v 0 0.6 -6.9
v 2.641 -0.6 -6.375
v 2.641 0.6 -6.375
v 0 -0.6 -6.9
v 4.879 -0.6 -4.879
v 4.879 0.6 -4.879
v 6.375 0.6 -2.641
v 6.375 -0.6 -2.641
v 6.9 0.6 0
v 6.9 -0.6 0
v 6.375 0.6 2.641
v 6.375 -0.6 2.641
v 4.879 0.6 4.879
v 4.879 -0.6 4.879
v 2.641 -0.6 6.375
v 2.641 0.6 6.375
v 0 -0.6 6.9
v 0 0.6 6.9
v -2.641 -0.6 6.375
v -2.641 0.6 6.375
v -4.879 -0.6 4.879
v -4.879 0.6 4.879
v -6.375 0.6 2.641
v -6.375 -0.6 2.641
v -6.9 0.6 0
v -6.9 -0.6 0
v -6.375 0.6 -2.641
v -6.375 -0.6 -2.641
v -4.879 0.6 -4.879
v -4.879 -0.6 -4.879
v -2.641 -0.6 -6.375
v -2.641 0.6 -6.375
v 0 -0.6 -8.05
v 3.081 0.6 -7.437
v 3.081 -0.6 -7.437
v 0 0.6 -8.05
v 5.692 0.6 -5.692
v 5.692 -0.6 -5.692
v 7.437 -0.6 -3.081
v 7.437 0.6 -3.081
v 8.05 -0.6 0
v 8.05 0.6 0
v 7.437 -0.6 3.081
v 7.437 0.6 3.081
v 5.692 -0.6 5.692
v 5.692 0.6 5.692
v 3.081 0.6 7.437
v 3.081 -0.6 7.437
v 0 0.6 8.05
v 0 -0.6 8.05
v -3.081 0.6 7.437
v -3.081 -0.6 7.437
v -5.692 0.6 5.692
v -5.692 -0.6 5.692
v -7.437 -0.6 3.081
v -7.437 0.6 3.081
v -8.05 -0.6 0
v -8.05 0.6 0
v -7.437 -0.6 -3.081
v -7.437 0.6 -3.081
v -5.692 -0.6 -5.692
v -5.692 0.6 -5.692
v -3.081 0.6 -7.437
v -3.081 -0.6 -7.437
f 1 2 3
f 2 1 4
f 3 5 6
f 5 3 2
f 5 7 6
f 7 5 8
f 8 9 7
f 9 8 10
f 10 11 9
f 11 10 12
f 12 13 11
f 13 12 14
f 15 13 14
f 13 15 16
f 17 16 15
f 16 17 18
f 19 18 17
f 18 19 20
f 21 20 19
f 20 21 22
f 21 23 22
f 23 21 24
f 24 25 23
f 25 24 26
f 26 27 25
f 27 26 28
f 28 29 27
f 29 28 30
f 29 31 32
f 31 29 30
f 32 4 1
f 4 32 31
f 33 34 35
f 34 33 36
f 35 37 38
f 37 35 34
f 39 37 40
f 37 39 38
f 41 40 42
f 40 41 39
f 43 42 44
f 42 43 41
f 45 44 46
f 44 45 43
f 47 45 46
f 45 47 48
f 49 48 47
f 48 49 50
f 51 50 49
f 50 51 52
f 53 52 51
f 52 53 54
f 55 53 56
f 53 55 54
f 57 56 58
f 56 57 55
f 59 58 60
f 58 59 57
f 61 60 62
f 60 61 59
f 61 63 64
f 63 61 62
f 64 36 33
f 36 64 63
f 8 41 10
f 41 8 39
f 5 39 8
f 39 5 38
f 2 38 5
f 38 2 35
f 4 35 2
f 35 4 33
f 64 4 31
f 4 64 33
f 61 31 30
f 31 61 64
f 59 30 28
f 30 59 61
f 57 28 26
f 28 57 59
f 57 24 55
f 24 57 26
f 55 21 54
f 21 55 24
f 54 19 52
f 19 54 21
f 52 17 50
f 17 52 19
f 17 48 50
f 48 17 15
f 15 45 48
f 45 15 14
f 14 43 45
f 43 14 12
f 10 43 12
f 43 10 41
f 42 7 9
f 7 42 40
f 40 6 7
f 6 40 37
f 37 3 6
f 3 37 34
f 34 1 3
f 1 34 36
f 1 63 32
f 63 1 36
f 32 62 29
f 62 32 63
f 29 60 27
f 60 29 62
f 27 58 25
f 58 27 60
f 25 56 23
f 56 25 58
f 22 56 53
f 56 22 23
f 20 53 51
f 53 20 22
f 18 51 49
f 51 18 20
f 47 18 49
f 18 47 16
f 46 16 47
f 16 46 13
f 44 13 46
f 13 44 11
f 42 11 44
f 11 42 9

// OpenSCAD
// file: ../p/4-4edge.scad
use <../lib.scad>
function ldraw_lib__4_4edge() = [
// 0 Circle 1.0
// 0 Name: 4-4edge.dat
// 0 Author: James Jessiman
// 0 !LDRAW_ORG Primitive UPDATE 2017-01
// 0 !LICENSE Licensed under CC BY 2.0 and CC BY 4.0 : see CAreadme.txt
// 
// 0 BFC CERTIFY CCW
  [0,"BFC","CERTIFY"],
  [0,"BFC","CCW"],
// 
// 0 !HISTORY 1998-12-15 [PTadmin] Official Update 1998-10
// 0 !HISTORY 2005-12-28 [PTadmin] Official Update 2005-01
// 0 !HISTORY 2007-06-24 [PTadmin] Header formatted for Contributor Agreement
// 0 !HISTORY 2008-07-01 [PTadmin] Official Update 2008-01
// 0 !HISTORY 2017-01-15 [Steffen] BFCed
// 0 !HISTORY 2017-12-30 [PTadmin] Official Update 2017-01
// 
// 
// 2 24 1 0 0 0.9239 0 0.3827
  [2,24,1,0,0,0.9239,0,0.3827],
// 2 24 0.9239 0 0.3827 0.7071 0 0.7071
  [2,24,0.9239,0,0.3827,0.7071,0,0.7071],
// 2 24 0.7071 0 0.7071 0.3827 0 0.9239
  [2,24,0.7071,0,0.7071,0.3827,0,0.9239],
// 2 24 0.3827 0 0.9239 0 0 1
  [2,24,0.3827,0,0.9239,0,0,1],
// 2 24 0 0 1 -0.3827 0 0.9239
  [2,24,0,0,1,-0.3827,0,0.9239],
// 2 24 -0.3827 0 0.9239 -0.7071 0 0.7071
  [2,24,-0.3827,0,0.9239,-0.7071,0,0.7071],
// 2 24 -0.7071 0 0.7071 -0.9239 0 0.3827
  [2,24,-0.7071,0,0.7071,-0.9239,0,0.3827],
// 2 24 -0.9239 0 0.3827 -1 0 -0
  [2,24,-0.9239,0,0.3827,-1,0,-0],
// 2 24 -1 0 -0 -0.9239 0 -0.3827
  [2,24,-1,0,-0,-0.9239,0,-0.3827],
// 2 24 -0.9239 0 -0.3827 -0.7071 0 -0.7071
  [2,24,-0.9239,0,-0.3827,-0.7071,0,-0.7071],
// 2 24 -0.7071 0 -0.7071 -0.3827 0 -0.9239
  [2,24,-0.7071,0,-0.7071,-0.3827,0,-0.9239],
// 2 24 -0.3827 0 -0.9239 0 0 -1
  [2,24,-0.3827,0,-0.9239,0,0,-1],
// 2 24 0 0 -1 0.3827 0 -0.9239
  [2,24,0,0,-1,0.3827,0,-0.9239],
// 2 24 0.3827 0 -0.9239 0.7071 0 -0.7071
  [2,24,0.3827,0,-0.9239,0.7071,0,-0.7071],
// 2 24 0.7071 0 -0.7071 0.9239 0 -0.3827
  [2,24,0.7071,0,-0.7071,0.9239,0,-0.3827],
// 2 24 0.9239 0 -0.3827 1 0 0
  [2,24,0.9239,0,-0.3827,1,0,0],
];
makepoly(ldraw_lib__4_4edge(), line=0.2);
// file: ../p/4-4cyli.scad
use <../lib.scad>
function ldraw_lib__4_4cyli() = [
// 0 Cylinder 1.0
// 0 Name: 4-4cyli.dat
// 0 Author: James Jessiman
// 0 !LDRAW_ORG Primitive UPDATE 2005-01
// 0 !LICENSE Licensed under CC BY 2.0 and CC BY 4.0 : see CAreadme.txt
// 
// 0 BFC CERTIFY CCW
  [0,"BFC","CERTIFY"],
  [0,"BFC","CCW"],
// 
// 0 !HISTORY 1998-12-15 [PTadmin] Official Update 1998-10
// 0 !HISTORY 2002-03-23 [sbliss] Added BFC statement; merged headers from files in distributions LDraw 0.27 and Complete.
// 0 !HISTORY 2002-04-25 [PTadmin] Official Update 2002-02
// 0 !HISTORY 2004-12-14 [guyvivan] BFC CCW
// 0 !HISTORY 2005-12-28 [PTadmin] Official Update 2005-01
// 0 !HISTORY 2007-06-24 [PTadmin] Header formatted for Contributor Agreement
// 0 !HISTORY 2008-07-01 [PTadmin] Official Update 2008-01
// 
// 
// 4 16 1 1 0 0.9239 1 0.3827 0.9239 0 0.3827 1 0 0
  [4,16,1,1,0,0.9239,1,0.3827,0.9239,0,0.3827,1,0,0],
// 5 24 1 0 0 1 1 0 0.9239 0 0.3827 0.9239 0 -0.3827
  [5,24,1,0,0,1,1,0,0.9239,0,0.3827,0.9239,0,-0.3827],
// 4 16 0.9239 1 0.3827 0.7071 1 0.7071 0.7071 0 0.7071 0.9239 0 0.3827
  [4,16,0.9239,1,0.3827,0.7071,1,0.7071,0.7071,0,0.7071,0.9239,0,0.3827],
// 5 24 0.9239 0 0.3827 0.9239 1 0.3827 0.7071 0 0.7071 1 0 0
  [5,24,0.9239,0,0.3827,0.9239,1,0.3827,0.7071,0,0.7071,1,0,0],
// 4 16 0.7071 1 0.7071 0.3827 1 0.9239 0.3827 0 0.9239 0.7071 0 0.7071
  [4,16,0.7071,1,0.7071,0.3827,1,0.9239,0.3827,0,0.9239,0.7071,0,0.7071],
// 5 24 0.7071 0 0.7071 0.7071 1 0.7071 0.3827 0 0.9239 0.9239 0 0.3827
  [5,24,0.7071,0,0.7071,0.7071,1,0.7071,0.3827,0,0.9239,0.9239,0,0.3827],
// 4 16 0.3827 1 0.9239 0 1 1 0 0 1 0.3827 0 0.9239
  [4,16,0.3827,1,0.9239,0,1,1,0,0,1,0.3827,0,0.9239],
// 5 24 0.3827 0 0.9239 0.3827 1 0.9239 0 0 1 0.7071 0 0.7071
  [5,24,0.3827,0,0.9239,0.3827,1,0.9239,0,0,1,0.7071,0,0.7071],
// 4 16 0 1 1 -0.3827 1 0.9239 -0.3827 0 0.9239 0 0 1
  [4,16,0,1,1,-0.3827,1,0.9239,-0.3827,0,0.9239,0,0,1],
// 5 24 0 0 1 0 1 1 -0.3827 0 0.9239 0.3827 0 0.9239
  [5,24,0,0,1,0,1,1,-0.3827,0,0.9239,0.3827,0,0.9239],
// 4 16 -0.3827 1 0.9239 -0.7071 1 0.7071 -0.7071 0 0.7071 -0.3827 0 0.9239
  [4,16,-0.3827,1,0.9239,-0.7071,1,0.7071,-0.7071,0,0.7071,-0.3827,0,0.9239],
// 5 24 -0.3827 0 0.9239 -0.3827 1 0.9239 -0.7071 0 0.7071 0 0 1
  [5,24,-0.3827,0,0.9239,-0.3827,1,0.9239,-0.7071,0,0.7071,0,0,1],
// 4 16 -0.7071 1 0.7071 -0.9239 1 0.3827 -0.9239 0 0.3827 -0.7071 0 0.7071
  [4,16,-0.7071,1,0.7071,-0.9239,1,0.3827,-0.9239,0,0.3827,-0.7071,0,0.7071],
// 5 24 -0.7071 0 0.7071 -0.7071 1 0.7071 -0.9239 0 0.3827 -0.3827 0 0.9239
  [5,24,-0.7071,0,0.7071,-0.7071,1,0.7071,-0.9239,0,0.3827,-0.3827,0,0.9239],
// 4 16 -0.9239 1 0.3827 -1 1 0 -1 0 0 -0.9239 0 0.3827
  [4,16,-0.9239,1,0.3827,-1,1,0,-1,0,0,-0.9239,0,0.3827],
// 5 24 -0.9239 0 0.3827 -0.9239 1 0.3827 -1 0 0 -0.7071 0 0.7071
  [5,24,-0.9239,0,0.3827,-0.9239,1,0.3827,-1,0,0,-0.7071,0,0.7071],
// 4 16 -1 1 0 -0.9239 1 -0.3827 -0.9239 0 -0.3827 -1 0 0
  [4,16,-1,1,0,-0.9239,1,-0.3827,-0.9239,0,-0.3827,-1,0,0],
// 5 24 -1 0 0 -1 1 0 -0.9239 0 -0.3827 -0.9239 0 0.3827
  [5,24,-1,0,0,-1,1,0,-0.9239,0,-0.3827,-0.9239,0,0.3827],
// 4 16 -0.9239 1 -0.3827 -0.7071 1 -0.7071 -0.7071 0 -0.7071 -0.9239 0 -0.3827
  [4,16,-0.9239,1,-0.3827,-0.7071,1,-0.7071,-0.7071,0,-0.7071,-0.9239,0,-0.3827],
// 5 24 -0.9239 0 -0.3827 -0.9239 1 -0.3827 -0.7071 0 -0.7071 -1 0 0
  [5,24,-0.9239,0,-0.3827,-0.9239,1,-0.3827,-0.7071,0,-0.7071,-1,0,0],
// 4 16 -0.7071 1 -0.7071 -0.3827 1 -0.9239 -0.3827 0 -0.9239 -0.7071 0 -0.7071
  [4,16,-0.7071,1,-0.7071,-0.3827,1,-0.9239,-0.3827,0,-0.9239,-0.7071,0,-0.7071],
// 5 24 -0.7071 0 -0.7071 -0.7071 1 -0.7071 -0.3827 0 -0.9239 -0.9239 0 -0.3827
  [5,24,-0.7071,0,-0.7071,-0.7071,1,-0.7071,-0.3827,0,-0.9239,-0.9239,0,-0.3827],
// 4 16 -0.3827 1 -0.9239 0 1 -1 0 0 -1 -0.3827 0 -0.9239
  [4,16,-0.3827,1,-0.9239,0,1,-1,0,0,-1,-0.3827,0,-0.9239],
// 5 24 -0.3827 0 -0.9239 -0.3827 1 -0.9239 0 0 -1 -0.7071 0 -0.7071
  [5,24,-0.3827,0,-0.9239,-0.3827,1,-0.9239,0,0,-1,-0.7071,0,-0.7071],
// 4 16 0 1 -1 0.3827 1 -0.9239 0.3827 0 -0.9239 0 0 -1
  [4,16,0,1,-1,0.3827,1,-0.9239,0.3827,0,-0.9239,0,0,-1],
// 5 24 0 0 -1 0 1 -1 0.3827 0 -0.9239 -0.3827 0 -0.9239
  [5,24,0,0,-1,0,1,-1,0.3827,0,-0.9239,-0.3827,0,-0.9239],
// 4 16 0.3827 1 -0.9239 0.7071 1 -0.7071 0.7071 0 -0.7071 0.3827 0 -0.9239
  [4,16,0.3827,1,-0.9239,0.7071,1,-0.7071,0.7071,0,-0.7071,0.3827,0,-0.9239],
// 5 24 0.3827 0 -0.9239 0.3827 1 -0.9239 0.7071 0 -0.7071 0 0 -1
  [5,24,0.3827,0,-0.9239,0.3827,1,-0.9239,0.7071,0,-0.7071,0,0,-1],
// 4 16 0.7071 1 -0.7071 0.9239 1 -0.3827 0.9239 0 -0.3827 0.7071 0 -0.7071
  [4,16,0.7071,1,-0.7071,0.9239,1,-0.3827,0.9239,0,-0.3827,0.7071,0,-0.7071],
// 5 24 0.7071 0 -0.7071 0.7071 1 -0.7071 0.9239 0 -0.3827 0.3827 0 -0.9239
  [5,24,0.7071,0,-0.7071,0.7071,1,-0.7071,0.9239,0,-0.3827,0.3827,0,-0.9239],
// 4 16 0.9239 1 -0.3827 1 1 0 1 0 0 0.9239 0 -0.3827
  [4,16,0.9239,1,-0.3827,1,1,0,1,0,0,0.9239,0,-0.3827],
// 5 24 0.9239 0 -0.3827 0.9239 1 -0.3827 1 0 0 0.7071 0 -0.7071
  [5,24,0.9239,0,-0.3827,0.9239,1,-0.3827,1,0,0,0.7071,0,-0.7071],
// 0
];
makepoly(ldraw_lib__4_4cyli(), line=0.2);
// file: ../p/4-4ring6.scad
use <../lib.scad>
function ldraw_lib__4_4ring6() = [
// 0 Ring  6 x 1.0
// 0 Name: 4-4ring6.dat
// 0 Author: Mark Kennedy [mkennedy]
// 0 !LDRAW_ORG Primitive UPDATE 2012-01
// 0 !LICENSE Licensed under CC BY 2.0 and CC BY 4.0 : see CAreadme.txt
// 
// 0 BFC CERTIFY CCW
  [0,"BFC","CERTIFY"],
  [0,"BFC","CCW"],
// 
// 0 !HISTORY 2001-10-23 [pneaster] resequenced quads, corrected winding.
// 0 !HISTORY 2001-11-30 [PTadmin] Official Update 2001-02
// 0 !HISTORY 2007-06-24 [PTadmin] Header formatted for Contributor Agreement
// 0 !HISTORY 2008-07-01 [PTadmin] Official Update 2008-01
// 0 !HISTORY 2012-02-16 [Philo] Changed to CCW
// 0 !HISTORY 2012-03-30 [PTadmin] Official Update 2012-01
// 
// 
// 4 16 7 0 0 6.4672 0 2.6788 5.5433 0 2.2961 6 0 0
  [4,16,7,0,0,6.4672,0,2.6788,5.5433,0,2.2961,6,0,0],
// 4 16 6.4672 0 2.6788 4.9497 0 4.9497 4.2426 0 4.2426 5.5433 0 2.2961
  [4,16,6.4672,0,2.6788,4.9497,0,4.9497,4.2426,0,4.2426,5.5433,0,2.2961],
// 4 16 4.9497 0 4.9497 2.6788 0 6.4672 2.2961 0 5.5433 4.2426 0 4.2426
  [4,16,4.9497,0,4.9497,2.6788,0,6.4672,2.2961,0,5.5433,4.2426,0,4.2426],
// 4 16 2.6788 0 6.4672 0 0 7 0 0 6 2.2961 0 5.5433
  [4,16,2.6788,0,6.4672,0,0,7,0,0,6,2.2961,0,5.5433],
// 4 16 0 0 7 -2.6788 0 6.4672 -2.2961 0 5.5433 0 0 6
  [4,16,0,0,7,-2.6788,0,6.4672,-2.2961,0,5.5433,0,0,6],
// 4 16 -2.6788 0 6.4672 -4.9497 0 4.9497 -4.2426 0 4.2426 -2.2961 0 5.5433
  [4,16,-2.6788,0,6.4672,-4.9497,0,4.9497,-4.2426,0,4.2426,-2.2961,0,5.5433],
// 4 16 -4.9497 0 4.9497 -6.4672 0 2.6788 -5.5433 0 2.2961 -4.2426 0 4.2426
  [4,16,-4.9497,0,4.9497,-6.4672,0,2.6788,-5.5433,0,2.2961,-4.2426,0,4.2426],
// 4 16 -6.4672 0 2.6788 -7 0 0 -6 0 0 -5.5433 0 2.2961
  [4,16,-6.4672,0,2.6788,-7,0,0,-6,0,0,-5.5433,0,2.2961],
// 4 16 -7 0 0 -6.4672 0 -2.6788 -5.5433 0 -2.2961 -6 0 0
  [4,16,-7,0,0,-6.4672,0,-2.6788,-5.5433,0,-2.2961,-6,0,0],
// 4 16 -6.4672 0 -2.6788 -4.9497 0 -4.9497 -4.2426 0 -4.2426 -5.5433 0 -2.2961
  [4,16,-6.4672,0,-2.6788,-4.9497,0,-4.9497,-4.2426,0,-4.2426,-5.5433,0,-2.2961],
// 4 16 -4.9497 0 -4.9497 -2.6788 0 -6.4672 -2.2961 0 -5.5433 -4.2426 0 -4.2426
  [4,16,-4.9497,0,-4.9497,-2.6788,0,-6.4672,-2.2961,0,-5.5433,-4.2426,0,-4.2426],
// 4 16 -2.6788 0 -6.4672 0 0 -7 0 0 -6 -2.2961 0 -5.5433
  [4,16,-2.6788,0,-6.4672,0,0,-7,0,0,-6,-2.2961,0,-5.5433],
// 4 16 0 0 -7 2.6788 0 -6.4672 2.2961 0 -5.5433 0 0 -6
  [4,16,0,0,-7,2.6788,0,-6.4672,2.2961,0,-5.5433,0,0,-6],
// 4 16 2.6788 0 -6.4672 4.9497 0 -4.9497 4.2426 0 -4.2426 2.2961 0 -5.5433
  [4,16,2.6788,0,-6.4672,4.9497,0,-4.9497,4.2426,0,-4.2426,2.2961,0,-5.5433],
// 4 16 4.9497 0 -4.9497 6.4672 0 -2.6788 5.5433 0 -2.2961 4.2426 0 -4.2426
  [4,16,4.9497,0,-4.9497,6.4672,0,-2.6788,5.5433,0,-2.2961,4.2426,0,-4.2426],
// 4 16 6.4672 0 -2.6788 7 0 0 6 0 0 5.5433 0 -2.2961
  [4,16,6.4672,0,-2.6788,7,0,0,6,0,0,5.5433,0,-2.2961],
];
makepoly(ldraw_lib__4_4ring6(), line=0.2);
// file: ../p/4-4cylo.scad
use <../lib.scad>
use <4-4cyli.scad>
use <4-4edge.scad>
function ldraw_lib__4_4cylo() = [
// 0 Cylinder Open 1.0
// 0 Name: 4-4cylo.dat
// 0 Author: Mark Kennedy [mkennedy]
// 0 !LDRAW_ORG Primitive UPDATE 2010-01
// 0 !LICENSE Licensed under CC BY 2.0 and CC BY 4.0 : see CAreadme.txt
// 
// 0 BFC CERTIFY CCW
  [0,"BFC","CERTIFY"],
  [0,"BFC","CCW"],
// 
// 0 !HISTORY 2010-04-05 [PTadmin] Official Update 2010-01
// 
// 
// 1 16 0 0 0 1 0 0 0 1 0 0 0 1 4-4edge.dat
  [1,16,0,0,0,1,0,0,0,1,0,0,0,1, ldraw_lib__4_4edge()],
// 1 16 0 1 0 1 0 0 0 1 0 0 0 1 4-4edge.dat
  [1,16,0,1,0,1,0,0,0,1,0,0,0,1, ldraw_lib__4_4edge()],
// 1 16 0 0 0 1 0 0 0 1 0 0 0 1 4-4cyli.dat
  [1,16,0,0,0,1,0,0,0,1,0,0,0,1, ldraw_lib__4_4cyli()],
// 0
];
makepoly(ldraw_lib__4_4cylo(), line=0.2);
// main file
use <../lib.scad>
use <../p/4-4cylo.scad>
use <../p/4-4ring6.scad>
function ldraw_lib__u151() = [
// 0 Rubber Belt Square 15 /  1.2
// 0 Name: u151.dat
// 0 Author: Damien Roux [Darats]
// 0 !LDRAW_ORG Part UPDATE 2015-02
// 0 !LICENSE Licensed under CC BY 2.0 and CC BY 4.0 : see CAreadme.txt
// 
// 0 BFC CERTIFY CCW
  [0,"BFC","CERTIFY"],
  [0,"BFC","CCW"],
// 
// 0 !CATEGORY Technic
// 
// 0 !HISTORY 2015-12-30 [PTadmin] Official Update 2015-02
// 
// 
// 0 // Nomenclature: Rubber Belt [Round|Square] belt_diameter_(mm) / belt_thickness_(mm)
// 
// 0 BFC INVERTNEXT
  [0,"BFC","INVERTNEXT"],
// 1 16 0 0 -1.5 0 0 17.25 17.25 0 0 0 3 0 4-4cylo.dat
  [1,16,0,0,-1.5,0,0,17.25,17.25,0,0,0,3,0, ldraw_lib__4_4cylo()],
// 1 16 0 0 -1.5 0 0 20.125 20.125 0 0 0 3 0 4-4cylo.dat
  [1,16,0,0,-1.5,0,0,20.125,20.125,0,0,0,3,0, ldraw_lib__4_4cylo()],
// 1 16 0 0 -1.5 2.875 0 0 0 0 2.875 0 1 0 4-4ring6.dat
  [1,16,0,0,-1.5,2.875,0,0,0,0,2.875,0,1,0, ldraw_lib__4_4ring6()],
// 1 16 0 0 1.5 2.875 0 0 0 0 2.875 0 -1 0 4-4ring6.dat
  [1,16,0,0,1.5,2.875,0,0,0,0,2.875,0,-1,0, ldraw_lib__4_4ring6()],
];
makepoly(ldraw_lib__u151(), line=0.2);
